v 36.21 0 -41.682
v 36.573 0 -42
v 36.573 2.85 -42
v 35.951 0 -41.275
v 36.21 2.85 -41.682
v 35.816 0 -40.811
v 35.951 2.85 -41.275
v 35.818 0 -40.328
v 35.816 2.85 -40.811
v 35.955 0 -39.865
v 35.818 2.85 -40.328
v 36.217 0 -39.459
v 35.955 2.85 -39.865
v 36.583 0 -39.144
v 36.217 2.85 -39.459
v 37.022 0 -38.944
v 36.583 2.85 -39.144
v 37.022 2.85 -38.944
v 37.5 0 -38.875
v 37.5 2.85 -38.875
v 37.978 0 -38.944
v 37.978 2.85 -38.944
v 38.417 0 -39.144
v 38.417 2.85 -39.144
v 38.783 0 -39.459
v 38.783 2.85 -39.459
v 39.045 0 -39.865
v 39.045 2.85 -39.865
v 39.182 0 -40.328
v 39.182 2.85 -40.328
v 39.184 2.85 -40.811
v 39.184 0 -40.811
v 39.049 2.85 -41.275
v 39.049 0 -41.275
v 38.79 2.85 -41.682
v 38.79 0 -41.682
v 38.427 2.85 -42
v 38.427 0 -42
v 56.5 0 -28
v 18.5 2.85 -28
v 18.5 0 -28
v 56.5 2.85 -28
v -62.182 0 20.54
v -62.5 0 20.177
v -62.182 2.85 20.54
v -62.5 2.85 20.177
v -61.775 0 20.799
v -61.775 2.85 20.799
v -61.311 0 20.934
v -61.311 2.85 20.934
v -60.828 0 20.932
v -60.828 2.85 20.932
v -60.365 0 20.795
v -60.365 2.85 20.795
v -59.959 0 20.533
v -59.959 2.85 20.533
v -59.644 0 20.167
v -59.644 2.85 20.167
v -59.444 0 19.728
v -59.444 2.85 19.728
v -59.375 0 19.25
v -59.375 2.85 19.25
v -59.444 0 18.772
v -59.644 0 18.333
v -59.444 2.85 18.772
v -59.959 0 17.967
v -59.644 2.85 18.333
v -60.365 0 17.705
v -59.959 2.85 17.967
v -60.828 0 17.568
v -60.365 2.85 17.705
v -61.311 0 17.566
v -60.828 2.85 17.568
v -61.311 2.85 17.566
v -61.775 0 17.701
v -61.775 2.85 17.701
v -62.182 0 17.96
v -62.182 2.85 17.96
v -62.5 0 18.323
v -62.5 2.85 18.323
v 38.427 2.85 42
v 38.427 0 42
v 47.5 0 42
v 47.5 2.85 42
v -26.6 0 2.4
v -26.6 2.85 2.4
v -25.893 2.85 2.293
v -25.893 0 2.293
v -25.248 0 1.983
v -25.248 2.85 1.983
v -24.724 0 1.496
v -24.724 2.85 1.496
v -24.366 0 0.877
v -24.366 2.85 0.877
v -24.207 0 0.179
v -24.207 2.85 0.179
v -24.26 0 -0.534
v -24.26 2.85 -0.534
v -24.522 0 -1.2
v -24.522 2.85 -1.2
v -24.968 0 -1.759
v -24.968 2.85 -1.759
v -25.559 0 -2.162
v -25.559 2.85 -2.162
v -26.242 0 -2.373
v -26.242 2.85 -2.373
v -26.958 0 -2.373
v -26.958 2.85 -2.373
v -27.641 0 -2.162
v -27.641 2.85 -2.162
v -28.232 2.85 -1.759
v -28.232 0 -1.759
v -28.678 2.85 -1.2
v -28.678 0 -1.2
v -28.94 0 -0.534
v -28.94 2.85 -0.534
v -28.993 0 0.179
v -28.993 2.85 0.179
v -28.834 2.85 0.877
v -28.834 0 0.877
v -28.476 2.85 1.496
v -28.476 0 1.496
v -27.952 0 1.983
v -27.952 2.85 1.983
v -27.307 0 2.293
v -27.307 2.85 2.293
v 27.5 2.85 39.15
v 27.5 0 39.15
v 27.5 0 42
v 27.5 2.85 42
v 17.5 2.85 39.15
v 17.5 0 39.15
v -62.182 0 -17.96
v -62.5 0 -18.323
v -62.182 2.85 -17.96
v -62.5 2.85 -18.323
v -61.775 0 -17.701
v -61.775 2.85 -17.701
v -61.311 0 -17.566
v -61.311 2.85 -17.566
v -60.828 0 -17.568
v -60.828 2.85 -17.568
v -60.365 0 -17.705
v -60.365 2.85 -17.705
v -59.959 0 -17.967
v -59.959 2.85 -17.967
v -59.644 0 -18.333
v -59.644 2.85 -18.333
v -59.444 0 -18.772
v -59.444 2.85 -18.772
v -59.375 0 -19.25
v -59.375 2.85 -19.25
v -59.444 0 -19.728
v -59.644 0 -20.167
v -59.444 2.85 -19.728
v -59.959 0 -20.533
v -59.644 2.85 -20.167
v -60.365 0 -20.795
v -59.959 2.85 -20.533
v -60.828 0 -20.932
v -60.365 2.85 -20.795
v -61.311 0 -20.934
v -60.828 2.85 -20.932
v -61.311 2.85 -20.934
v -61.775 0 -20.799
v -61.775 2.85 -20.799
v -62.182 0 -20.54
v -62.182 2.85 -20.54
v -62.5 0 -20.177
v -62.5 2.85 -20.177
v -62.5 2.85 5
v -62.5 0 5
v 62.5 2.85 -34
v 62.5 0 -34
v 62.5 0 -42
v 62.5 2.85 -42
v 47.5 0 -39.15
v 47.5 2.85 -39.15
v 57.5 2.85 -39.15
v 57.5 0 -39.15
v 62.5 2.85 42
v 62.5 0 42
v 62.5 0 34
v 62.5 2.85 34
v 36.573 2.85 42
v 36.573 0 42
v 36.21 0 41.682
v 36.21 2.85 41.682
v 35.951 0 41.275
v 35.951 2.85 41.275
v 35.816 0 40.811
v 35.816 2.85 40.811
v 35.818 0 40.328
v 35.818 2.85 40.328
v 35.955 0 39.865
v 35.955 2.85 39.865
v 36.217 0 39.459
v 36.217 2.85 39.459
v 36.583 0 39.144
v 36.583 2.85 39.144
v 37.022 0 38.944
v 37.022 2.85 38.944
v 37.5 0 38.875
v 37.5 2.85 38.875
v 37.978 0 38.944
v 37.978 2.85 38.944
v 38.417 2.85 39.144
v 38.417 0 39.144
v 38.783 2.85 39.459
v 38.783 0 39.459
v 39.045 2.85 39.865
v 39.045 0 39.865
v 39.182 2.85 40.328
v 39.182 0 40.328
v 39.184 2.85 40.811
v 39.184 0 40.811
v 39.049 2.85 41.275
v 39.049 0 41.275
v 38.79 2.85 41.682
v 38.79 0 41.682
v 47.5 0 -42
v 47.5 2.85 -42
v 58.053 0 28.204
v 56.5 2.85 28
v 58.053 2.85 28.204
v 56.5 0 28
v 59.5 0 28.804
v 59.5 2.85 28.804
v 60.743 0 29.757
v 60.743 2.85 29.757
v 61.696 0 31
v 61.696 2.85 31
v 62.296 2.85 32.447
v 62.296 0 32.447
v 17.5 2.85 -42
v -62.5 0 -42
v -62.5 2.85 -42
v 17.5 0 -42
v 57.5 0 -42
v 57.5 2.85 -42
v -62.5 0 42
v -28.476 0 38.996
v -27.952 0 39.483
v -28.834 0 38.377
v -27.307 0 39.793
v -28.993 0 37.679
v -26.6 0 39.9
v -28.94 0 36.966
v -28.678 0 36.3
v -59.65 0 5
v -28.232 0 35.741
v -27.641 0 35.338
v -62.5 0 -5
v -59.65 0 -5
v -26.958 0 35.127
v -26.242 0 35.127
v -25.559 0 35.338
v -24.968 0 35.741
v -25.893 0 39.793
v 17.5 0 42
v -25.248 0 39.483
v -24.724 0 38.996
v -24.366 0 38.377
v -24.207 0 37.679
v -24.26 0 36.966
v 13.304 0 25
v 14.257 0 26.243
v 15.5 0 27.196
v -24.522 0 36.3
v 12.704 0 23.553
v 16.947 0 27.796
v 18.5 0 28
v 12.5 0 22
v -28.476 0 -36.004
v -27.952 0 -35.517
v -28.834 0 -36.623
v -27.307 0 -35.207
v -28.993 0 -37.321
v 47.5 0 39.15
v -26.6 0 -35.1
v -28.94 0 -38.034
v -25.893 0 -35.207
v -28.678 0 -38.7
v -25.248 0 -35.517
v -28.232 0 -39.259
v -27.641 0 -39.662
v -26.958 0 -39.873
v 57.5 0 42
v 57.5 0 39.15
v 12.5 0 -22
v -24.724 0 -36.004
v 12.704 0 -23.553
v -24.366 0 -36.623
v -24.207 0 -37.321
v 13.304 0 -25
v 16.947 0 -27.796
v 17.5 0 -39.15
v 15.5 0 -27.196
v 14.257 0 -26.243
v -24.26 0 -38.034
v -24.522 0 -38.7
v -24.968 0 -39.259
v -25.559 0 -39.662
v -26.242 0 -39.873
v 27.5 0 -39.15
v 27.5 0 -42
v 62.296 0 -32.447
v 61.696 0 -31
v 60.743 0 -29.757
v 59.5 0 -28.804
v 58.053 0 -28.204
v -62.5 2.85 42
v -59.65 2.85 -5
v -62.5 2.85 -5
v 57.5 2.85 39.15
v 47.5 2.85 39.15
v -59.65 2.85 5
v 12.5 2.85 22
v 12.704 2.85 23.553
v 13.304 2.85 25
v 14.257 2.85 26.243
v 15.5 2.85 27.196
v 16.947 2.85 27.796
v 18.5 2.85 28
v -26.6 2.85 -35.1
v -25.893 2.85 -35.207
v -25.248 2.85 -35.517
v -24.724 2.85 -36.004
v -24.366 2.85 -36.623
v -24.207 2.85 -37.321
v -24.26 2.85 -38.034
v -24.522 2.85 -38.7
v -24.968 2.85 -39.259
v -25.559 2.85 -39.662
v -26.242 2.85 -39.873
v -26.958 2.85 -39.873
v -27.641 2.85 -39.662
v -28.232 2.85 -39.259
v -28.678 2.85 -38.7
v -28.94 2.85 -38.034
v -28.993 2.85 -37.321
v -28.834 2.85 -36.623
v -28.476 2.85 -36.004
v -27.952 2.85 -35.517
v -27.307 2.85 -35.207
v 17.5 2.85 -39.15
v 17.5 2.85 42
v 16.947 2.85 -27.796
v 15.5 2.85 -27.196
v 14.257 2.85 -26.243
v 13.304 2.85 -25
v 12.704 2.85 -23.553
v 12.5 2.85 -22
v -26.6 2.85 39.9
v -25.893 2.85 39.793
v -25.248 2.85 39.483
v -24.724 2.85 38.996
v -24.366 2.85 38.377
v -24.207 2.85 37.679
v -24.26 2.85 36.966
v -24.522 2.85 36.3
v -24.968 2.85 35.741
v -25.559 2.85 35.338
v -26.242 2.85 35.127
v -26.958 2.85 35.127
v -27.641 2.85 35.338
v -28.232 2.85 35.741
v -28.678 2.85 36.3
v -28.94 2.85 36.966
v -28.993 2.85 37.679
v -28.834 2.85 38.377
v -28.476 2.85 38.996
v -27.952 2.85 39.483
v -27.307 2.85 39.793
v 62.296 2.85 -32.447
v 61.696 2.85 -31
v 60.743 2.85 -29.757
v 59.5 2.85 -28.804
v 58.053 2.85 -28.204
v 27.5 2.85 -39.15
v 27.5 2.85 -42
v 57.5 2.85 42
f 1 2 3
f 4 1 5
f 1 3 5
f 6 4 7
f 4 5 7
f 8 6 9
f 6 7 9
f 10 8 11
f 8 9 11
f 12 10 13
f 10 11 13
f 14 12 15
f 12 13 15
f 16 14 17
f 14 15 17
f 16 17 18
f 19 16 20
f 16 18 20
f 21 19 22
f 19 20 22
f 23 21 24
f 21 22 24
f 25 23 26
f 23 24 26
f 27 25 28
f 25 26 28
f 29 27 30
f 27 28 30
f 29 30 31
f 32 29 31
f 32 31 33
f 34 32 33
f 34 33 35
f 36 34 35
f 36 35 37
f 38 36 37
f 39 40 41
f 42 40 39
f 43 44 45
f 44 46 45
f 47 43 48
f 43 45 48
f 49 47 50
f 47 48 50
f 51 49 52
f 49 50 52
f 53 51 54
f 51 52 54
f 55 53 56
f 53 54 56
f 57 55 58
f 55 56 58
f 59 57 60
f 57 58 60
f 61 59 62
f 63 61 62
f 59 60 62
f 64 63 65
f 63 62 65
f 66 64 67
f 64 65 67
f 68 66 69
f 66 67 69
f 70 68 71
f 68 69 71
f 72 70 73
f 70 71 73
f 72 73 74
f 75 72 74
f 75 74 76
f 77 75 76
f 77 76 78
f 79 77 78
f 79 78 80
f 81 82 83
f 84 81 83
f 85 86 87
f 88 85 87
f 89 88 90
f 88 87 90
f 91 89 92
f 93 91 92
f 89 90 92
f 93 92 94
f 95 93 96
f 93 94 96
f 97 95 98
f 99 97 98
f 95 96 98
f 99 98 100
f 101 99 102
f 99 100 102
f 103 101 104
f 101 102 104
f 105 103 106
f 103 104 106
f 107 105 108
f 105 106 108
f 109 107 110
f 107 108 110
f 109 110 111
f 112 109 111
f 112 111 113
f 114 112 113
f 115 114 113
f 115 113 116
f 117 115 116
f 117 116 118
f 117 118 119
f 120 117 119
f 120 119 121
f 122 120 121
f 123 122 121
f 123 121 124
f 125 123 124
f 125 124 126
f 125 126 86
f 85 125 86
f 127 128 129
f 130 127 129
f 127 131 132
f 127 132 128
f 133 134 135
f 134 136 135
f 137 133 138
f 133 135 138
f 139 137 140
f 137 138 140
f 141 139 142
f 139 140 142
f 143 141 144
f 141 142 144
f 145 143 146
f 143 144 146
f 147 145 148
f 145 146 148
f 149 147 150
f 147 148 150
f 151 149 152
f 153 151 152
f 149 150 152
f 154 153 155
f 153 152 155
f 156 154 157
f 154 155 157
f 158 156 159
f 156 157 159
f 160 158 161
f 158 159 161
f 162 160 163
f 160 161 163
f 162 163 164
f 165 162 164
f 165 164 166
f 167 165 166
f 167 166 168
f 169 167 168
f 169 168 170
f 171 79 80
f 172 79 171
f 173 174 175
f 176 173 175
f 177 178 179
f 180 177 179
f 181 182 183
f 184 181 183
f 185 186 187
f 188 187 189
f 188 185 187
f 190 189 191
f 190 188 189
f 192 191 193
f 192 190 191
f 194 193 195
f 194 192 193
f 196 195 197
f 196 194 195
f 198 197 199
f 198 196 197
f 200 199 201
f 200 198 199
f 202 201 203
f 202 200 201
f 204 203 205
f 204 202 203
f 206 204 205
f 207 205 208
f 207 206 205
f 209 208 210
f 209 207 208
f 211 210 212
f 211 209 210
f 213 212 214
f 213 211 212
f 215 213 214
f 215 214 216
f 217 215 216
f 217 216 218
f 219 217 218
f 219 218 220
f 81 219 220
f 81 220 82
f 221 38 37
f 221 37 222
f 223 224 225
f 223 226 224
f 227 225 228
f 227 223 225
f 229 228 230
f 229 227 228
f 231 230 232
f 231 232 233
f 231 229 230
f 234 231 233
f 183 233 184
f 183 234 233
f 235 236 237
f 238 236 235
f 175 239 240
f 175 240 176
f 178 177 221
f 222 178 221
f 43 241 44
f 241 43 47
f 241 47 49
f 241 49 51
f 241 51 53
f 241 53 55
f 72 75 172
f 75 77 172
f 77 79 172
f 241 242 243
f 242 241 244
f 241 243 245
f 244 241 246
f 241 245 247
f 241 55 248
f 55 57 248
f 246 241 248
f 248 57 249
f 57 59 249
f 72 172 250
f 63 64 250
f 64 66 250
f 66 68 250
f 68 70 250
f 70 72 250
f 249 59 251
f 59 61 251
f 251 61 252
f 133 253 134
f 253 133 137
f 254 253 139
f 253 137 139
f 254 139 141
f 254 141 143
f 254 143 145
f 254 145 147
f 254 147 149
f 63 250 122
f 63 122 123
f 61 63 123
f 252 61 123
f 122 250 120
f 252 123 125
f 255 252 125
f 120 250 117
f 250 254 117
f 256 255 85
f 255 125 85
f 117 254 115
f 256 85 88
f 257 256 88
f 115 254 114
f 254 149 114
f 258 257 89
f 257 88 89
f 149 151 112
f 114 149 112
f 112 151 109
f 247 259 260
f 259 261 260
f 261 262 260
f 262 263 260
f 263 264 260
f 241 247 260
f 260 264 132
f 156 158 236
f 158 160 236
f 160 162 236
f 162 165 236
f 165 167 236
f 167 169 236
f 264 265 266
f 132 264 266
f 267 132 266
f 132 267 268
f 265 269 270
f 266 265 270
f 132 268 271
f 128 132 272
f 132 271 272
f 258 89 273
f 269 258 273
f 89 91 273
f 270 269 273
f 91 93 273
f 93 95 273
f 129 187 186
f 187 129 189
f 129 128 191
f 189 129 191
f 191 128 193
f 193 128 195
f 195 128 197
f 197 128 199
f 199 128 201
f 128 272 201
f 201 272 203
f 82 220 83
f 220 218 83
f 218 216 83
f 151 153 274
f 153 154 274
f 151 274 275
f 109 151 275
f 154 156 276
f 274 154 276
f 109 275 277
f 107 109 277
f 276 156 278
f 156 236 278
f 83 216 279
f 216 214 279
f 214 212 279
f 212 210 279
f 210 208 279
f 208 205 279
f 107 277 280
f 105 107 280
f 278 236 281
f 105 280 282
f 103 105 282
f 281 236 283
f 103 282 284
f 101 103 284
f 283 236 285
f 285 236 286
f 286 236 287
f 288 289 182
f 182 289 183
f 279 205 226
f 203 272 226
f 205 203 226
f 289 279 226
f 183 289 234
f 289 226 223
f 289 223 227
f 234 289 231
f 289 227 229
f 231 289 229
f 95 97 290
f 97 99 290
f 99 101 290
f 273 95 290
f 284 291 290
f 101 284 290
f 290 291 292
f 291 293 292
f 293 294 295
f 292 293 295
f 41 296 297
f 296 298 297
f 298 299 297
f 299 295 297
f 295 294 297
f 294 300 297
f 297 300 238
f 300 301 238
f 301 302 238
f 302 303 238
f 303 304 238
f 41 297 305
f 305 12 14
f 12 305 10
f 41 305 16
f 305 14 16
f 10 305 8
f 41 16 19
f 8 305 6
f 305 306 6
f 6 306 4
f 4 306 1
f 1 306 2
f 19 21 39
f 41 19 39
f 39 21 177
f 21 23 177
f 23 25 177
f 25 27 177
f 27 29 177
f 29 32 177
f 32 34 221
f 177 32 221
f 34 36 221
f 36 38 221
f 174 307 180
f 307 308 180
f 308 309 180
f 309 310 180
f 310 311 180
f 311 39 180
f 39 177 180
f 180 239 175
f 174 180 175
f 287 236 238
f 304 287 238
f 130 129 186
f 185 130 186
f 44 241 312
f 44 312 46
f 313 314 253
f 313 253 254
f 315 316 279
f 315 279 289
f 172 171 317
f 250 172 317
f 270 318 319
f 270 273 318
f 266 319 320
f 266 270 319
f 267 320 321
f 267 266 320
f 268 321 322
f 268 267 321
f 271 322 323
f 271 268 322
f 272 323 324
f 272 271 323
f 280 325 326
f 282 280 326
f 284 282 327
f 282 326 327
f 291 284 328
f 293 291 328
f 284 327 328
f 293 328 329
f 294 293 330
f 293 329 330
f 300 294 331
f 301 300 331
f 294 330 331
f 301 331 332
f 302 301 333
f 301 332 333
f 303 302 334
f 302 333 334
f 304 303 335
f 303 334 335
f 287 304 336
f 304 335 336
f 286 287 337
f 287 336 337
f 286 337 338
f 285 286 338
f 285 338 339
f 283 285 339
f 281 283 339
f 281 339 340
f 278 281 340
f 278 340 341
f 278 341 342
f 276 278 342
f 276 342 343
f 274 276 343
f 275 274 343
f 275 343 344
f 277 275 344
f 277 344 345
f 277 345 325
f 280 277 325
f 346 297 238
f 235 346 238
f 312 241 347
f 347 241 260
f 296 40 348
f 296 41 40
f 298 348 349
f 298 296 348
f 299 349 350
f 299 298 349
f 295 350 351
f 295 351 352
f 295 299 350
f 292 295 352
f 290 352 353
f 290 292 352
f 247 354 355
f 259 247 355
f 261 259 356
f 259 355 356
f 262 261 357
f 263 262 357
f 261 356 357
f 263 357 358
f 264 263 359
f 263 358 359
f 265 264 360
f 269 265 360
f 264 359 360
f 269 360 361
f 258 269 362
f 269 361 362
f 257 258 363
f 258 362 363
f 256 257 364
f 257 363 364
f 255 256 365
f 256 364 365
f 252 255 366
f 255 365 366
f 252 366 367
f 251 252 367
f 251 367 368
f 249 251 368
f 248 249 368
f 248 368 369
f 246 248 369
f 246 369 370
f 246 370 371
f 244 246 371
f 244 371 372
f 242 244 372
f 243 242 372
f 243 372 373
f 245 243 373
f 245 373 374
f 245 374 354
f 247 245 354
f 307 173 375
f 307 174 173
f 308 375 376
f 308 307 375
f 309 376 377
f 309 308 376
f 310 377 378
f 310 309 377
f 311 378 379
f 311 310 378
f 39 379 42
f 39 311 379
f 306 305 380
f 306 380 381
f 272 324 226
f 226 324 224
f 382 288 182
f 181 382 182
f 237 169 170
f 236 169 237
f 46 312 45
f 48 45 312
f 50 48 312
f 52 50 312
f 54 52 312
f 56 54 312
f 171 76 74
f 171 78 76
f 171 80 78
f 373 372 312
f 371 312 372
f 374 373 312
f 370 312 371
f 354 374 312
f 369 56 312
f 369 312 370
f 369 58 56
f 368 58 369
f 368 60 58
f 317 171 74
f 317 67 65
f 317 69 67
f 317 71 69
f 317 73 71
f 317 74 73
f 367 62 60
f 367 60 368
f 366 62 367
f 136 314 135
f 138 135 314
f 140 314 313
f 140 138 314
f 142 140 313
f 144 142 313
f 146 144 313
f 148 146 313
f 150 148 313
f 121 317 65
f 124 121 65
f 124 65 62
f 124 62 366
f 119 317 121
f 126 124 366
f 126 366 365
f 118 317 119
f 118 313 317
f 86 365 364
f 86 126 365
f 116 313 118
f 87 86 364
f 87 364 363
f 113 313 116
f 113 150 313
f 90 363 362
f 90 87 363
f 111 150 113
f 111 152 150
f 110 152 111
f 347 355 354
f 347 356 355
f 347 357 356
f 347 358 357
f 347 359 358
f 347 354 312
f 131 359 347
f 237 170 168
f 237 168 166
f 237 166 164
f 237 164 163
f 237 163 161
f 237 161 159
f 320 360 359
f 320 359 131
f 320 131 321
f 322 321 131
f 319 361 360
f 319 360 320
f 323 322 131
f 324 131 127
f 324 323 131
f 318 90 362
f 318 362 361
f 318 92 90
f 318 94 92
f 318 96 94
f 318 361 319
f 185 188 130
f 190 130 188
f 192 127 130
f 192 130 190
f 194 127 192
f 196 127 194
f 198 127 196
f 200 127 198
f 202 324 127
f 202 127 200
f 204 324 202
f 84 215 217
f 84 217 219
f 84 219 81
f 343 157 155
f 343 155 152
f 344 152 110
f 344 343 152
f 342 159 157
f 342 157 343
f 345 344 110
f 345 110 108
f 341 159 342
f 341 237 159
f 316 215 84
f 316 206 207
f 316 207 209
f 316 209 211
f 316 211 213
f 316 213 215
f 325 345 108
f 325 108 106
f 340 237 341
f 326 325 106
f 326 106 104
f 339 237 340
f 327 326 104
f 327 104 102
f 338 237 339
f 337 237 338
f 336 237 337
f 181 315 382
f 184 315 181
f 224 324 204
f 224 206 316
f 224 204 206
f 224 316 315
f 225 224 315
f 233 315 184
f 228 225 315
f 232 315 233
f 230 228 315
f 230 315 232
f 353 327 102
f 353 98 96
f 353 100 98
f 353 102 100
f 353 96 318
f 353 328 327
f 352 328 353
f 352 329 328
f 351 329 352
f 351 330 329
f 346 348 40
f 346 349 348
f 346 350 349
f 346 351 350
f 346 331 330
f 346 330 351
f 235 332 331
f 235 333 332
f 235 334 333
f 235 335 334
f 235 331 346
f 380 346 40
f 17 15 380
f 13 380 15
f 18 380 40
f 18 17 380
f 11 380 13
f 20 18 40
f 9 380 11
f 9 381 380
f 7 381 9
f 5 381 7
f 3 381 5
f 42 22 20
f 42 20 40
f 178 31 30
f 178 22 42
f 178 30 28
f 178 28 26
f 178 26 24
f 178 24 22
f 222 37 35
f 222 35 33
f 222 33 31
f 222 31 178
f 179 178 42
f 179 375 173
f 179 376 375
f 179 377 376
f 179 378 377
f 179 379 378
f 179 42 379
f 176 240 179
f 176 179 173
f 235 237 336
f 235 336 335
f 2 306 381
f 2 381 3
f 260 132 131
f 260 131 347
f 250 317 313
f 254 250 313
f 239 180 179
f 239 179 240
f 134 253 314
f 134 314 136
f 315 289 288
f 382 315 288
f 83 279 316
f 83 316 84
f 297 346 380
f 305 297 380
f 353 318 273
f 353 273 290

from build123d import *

# Parameters (mm, degrees)
SKETCH1_W           = 125
SKETCH1_H           = 84
BOSS_EXTRUDE1_DEPTH = 2.85
SKETCH2_R           = 1.5
CUT_EXTRUDE1_DEPTH  = 76.354976611
SKETCH3_R           = 2.4
CUT_EXTRUDE2_DEPTH  = 76.354976611
SKETCH4_R           = 1.7
SKETCH4_W           = 2.85
SKETCH4_H           = 10
CUT_EXTRUDE3_DEPTH  = 76.354976611
SKETCH5_R           = 1.7
SKETCH5_W           = 10
SKETCH5_H           = 2.85
CUT_EXTRUDE4_DEPTH  = 76.354976611
SKETCH6_W           = 50
SKETCH6_H           = 56
CUT_EXTRUDE5_DEPTH  = 76.354976611
FILLET1_R           = 6


with BuildPart() as part:
    # Sketch1 → Boss-Extrude1 (new body)
    with BuildSketch(Plane(origin=(0, 0, 0), x_dir=(1, 0, 0), z_dir=(0, 1, 0))):
        Rectangle(SKETCH1_W, SKETCH1_H)
    extrude(amount=BOSS_EXTRUDE1_DEPTH)

    # Sketch2 → Cut-Extrude1 (cut, through all)
    with BuildSketch(Plane.XZ):
        with Locations(Location((44.5, 0, 0), (0, 0, 270))):
            Circle(SKETCH2_R)
    extrude(amount=-CUT_EXTRUDE1_DEPTH, mode=Mode.SUBTRACT)

    # Sketch3 → Cut-Extrude2 (cut, through all)
    with BuildSketch(Plane(origin=(0, 2.85, 0), x_dir=(1, 0, 0), z_dir=(0, 1, 0))):
        with Locations(Location((-26.6, 0, 0), (0, 0, 270))):
            Circle(SKETCH3_R)
        with Locations(Location((-26.6, 37.5, 0), (0, 0, 270))):
            Circle(SKETCH3_R)
        with Locations(Location((-26.6, -37.5, 0), (0, 0, 270))):
            Circle(SKETCH3_R)
    extrude(amount=-CUT_EXTRUDE2_DEPTH, mode=Mode.SUBTRACT)

    # Sketch4 → Cut-Extrude3 (cut, through all)
    with BuildSketch(Plane(origin=(0, 2.85, 0), x_dir=(1, 0, 0), z_dir=(0, 1, 0))):
        with Locations((-61.075, -19.25)):
            Circle(SKETCH4_R)
        with Locations((-61.075, 19.25)):
            Circle(SKETCH4_R)
        with Locations((-61.075, 0)):
            Rectangle(SKETCH4_W, SKETCH4_H)
    extrude(amount=-CUT_EXTRUDE3_DEPTH, mode=Mode.SUBTRACT)

    # Sketch5 → Cut-Extrude4 (cut, through all)
    with BuildSketch(Plane(origin=(0, 2.85, 0), x_dir=(1, 0, 0), z_dir=(0, 1, 0))):
        with Locations((37.5, 40.575)):
            Circle(SKETCH5_R)
        with Locations((52.5, 40.575)):
            Rectangle(SKETCH5_W, SKETCH5_H)
        with Locations((22.5, 40.575)):
            Rectangle(SKETCH5_W, SKETCH5_H)
    cut_extrude4 = extrude(amount=-CUT_EXTRUDE4_DEPTH, mode=Mode.SUBTRACT)

    # Mirror1: Cut-Extrude4 across plane
    add(cut_extrude4.mirror(Plane.XY), mode=Mode.SUBTRACT)

    # Sketch6 → Cut-Extrude5 (cut, through all)
    with BuildSketch(Plane(origin=(0, 2.85, 0), x_dir=(1, 0, 0), z_dir=(0, 1, 0))):
        with Locations((37.5, 0)):
            Rectangle(SKETCH6_W, SKETCH6_H)
    extrude(amount=-CUT_EXTRUDE5_DEPTH, mode=Mode.SUBTRACT)

    # Fillet1
    fillet1_edges = [part.edges().sort_by_distance(p)[0] for p in [
        (62.5, 1.425, -28),
        (62.5, 1.425, 28),
        (12.5, 1.425, 28),
        (12.5, 1.425, -28),
    ]]
    fillet(fillet1_edges, radius=FILLET1_R)


solid = part.part
